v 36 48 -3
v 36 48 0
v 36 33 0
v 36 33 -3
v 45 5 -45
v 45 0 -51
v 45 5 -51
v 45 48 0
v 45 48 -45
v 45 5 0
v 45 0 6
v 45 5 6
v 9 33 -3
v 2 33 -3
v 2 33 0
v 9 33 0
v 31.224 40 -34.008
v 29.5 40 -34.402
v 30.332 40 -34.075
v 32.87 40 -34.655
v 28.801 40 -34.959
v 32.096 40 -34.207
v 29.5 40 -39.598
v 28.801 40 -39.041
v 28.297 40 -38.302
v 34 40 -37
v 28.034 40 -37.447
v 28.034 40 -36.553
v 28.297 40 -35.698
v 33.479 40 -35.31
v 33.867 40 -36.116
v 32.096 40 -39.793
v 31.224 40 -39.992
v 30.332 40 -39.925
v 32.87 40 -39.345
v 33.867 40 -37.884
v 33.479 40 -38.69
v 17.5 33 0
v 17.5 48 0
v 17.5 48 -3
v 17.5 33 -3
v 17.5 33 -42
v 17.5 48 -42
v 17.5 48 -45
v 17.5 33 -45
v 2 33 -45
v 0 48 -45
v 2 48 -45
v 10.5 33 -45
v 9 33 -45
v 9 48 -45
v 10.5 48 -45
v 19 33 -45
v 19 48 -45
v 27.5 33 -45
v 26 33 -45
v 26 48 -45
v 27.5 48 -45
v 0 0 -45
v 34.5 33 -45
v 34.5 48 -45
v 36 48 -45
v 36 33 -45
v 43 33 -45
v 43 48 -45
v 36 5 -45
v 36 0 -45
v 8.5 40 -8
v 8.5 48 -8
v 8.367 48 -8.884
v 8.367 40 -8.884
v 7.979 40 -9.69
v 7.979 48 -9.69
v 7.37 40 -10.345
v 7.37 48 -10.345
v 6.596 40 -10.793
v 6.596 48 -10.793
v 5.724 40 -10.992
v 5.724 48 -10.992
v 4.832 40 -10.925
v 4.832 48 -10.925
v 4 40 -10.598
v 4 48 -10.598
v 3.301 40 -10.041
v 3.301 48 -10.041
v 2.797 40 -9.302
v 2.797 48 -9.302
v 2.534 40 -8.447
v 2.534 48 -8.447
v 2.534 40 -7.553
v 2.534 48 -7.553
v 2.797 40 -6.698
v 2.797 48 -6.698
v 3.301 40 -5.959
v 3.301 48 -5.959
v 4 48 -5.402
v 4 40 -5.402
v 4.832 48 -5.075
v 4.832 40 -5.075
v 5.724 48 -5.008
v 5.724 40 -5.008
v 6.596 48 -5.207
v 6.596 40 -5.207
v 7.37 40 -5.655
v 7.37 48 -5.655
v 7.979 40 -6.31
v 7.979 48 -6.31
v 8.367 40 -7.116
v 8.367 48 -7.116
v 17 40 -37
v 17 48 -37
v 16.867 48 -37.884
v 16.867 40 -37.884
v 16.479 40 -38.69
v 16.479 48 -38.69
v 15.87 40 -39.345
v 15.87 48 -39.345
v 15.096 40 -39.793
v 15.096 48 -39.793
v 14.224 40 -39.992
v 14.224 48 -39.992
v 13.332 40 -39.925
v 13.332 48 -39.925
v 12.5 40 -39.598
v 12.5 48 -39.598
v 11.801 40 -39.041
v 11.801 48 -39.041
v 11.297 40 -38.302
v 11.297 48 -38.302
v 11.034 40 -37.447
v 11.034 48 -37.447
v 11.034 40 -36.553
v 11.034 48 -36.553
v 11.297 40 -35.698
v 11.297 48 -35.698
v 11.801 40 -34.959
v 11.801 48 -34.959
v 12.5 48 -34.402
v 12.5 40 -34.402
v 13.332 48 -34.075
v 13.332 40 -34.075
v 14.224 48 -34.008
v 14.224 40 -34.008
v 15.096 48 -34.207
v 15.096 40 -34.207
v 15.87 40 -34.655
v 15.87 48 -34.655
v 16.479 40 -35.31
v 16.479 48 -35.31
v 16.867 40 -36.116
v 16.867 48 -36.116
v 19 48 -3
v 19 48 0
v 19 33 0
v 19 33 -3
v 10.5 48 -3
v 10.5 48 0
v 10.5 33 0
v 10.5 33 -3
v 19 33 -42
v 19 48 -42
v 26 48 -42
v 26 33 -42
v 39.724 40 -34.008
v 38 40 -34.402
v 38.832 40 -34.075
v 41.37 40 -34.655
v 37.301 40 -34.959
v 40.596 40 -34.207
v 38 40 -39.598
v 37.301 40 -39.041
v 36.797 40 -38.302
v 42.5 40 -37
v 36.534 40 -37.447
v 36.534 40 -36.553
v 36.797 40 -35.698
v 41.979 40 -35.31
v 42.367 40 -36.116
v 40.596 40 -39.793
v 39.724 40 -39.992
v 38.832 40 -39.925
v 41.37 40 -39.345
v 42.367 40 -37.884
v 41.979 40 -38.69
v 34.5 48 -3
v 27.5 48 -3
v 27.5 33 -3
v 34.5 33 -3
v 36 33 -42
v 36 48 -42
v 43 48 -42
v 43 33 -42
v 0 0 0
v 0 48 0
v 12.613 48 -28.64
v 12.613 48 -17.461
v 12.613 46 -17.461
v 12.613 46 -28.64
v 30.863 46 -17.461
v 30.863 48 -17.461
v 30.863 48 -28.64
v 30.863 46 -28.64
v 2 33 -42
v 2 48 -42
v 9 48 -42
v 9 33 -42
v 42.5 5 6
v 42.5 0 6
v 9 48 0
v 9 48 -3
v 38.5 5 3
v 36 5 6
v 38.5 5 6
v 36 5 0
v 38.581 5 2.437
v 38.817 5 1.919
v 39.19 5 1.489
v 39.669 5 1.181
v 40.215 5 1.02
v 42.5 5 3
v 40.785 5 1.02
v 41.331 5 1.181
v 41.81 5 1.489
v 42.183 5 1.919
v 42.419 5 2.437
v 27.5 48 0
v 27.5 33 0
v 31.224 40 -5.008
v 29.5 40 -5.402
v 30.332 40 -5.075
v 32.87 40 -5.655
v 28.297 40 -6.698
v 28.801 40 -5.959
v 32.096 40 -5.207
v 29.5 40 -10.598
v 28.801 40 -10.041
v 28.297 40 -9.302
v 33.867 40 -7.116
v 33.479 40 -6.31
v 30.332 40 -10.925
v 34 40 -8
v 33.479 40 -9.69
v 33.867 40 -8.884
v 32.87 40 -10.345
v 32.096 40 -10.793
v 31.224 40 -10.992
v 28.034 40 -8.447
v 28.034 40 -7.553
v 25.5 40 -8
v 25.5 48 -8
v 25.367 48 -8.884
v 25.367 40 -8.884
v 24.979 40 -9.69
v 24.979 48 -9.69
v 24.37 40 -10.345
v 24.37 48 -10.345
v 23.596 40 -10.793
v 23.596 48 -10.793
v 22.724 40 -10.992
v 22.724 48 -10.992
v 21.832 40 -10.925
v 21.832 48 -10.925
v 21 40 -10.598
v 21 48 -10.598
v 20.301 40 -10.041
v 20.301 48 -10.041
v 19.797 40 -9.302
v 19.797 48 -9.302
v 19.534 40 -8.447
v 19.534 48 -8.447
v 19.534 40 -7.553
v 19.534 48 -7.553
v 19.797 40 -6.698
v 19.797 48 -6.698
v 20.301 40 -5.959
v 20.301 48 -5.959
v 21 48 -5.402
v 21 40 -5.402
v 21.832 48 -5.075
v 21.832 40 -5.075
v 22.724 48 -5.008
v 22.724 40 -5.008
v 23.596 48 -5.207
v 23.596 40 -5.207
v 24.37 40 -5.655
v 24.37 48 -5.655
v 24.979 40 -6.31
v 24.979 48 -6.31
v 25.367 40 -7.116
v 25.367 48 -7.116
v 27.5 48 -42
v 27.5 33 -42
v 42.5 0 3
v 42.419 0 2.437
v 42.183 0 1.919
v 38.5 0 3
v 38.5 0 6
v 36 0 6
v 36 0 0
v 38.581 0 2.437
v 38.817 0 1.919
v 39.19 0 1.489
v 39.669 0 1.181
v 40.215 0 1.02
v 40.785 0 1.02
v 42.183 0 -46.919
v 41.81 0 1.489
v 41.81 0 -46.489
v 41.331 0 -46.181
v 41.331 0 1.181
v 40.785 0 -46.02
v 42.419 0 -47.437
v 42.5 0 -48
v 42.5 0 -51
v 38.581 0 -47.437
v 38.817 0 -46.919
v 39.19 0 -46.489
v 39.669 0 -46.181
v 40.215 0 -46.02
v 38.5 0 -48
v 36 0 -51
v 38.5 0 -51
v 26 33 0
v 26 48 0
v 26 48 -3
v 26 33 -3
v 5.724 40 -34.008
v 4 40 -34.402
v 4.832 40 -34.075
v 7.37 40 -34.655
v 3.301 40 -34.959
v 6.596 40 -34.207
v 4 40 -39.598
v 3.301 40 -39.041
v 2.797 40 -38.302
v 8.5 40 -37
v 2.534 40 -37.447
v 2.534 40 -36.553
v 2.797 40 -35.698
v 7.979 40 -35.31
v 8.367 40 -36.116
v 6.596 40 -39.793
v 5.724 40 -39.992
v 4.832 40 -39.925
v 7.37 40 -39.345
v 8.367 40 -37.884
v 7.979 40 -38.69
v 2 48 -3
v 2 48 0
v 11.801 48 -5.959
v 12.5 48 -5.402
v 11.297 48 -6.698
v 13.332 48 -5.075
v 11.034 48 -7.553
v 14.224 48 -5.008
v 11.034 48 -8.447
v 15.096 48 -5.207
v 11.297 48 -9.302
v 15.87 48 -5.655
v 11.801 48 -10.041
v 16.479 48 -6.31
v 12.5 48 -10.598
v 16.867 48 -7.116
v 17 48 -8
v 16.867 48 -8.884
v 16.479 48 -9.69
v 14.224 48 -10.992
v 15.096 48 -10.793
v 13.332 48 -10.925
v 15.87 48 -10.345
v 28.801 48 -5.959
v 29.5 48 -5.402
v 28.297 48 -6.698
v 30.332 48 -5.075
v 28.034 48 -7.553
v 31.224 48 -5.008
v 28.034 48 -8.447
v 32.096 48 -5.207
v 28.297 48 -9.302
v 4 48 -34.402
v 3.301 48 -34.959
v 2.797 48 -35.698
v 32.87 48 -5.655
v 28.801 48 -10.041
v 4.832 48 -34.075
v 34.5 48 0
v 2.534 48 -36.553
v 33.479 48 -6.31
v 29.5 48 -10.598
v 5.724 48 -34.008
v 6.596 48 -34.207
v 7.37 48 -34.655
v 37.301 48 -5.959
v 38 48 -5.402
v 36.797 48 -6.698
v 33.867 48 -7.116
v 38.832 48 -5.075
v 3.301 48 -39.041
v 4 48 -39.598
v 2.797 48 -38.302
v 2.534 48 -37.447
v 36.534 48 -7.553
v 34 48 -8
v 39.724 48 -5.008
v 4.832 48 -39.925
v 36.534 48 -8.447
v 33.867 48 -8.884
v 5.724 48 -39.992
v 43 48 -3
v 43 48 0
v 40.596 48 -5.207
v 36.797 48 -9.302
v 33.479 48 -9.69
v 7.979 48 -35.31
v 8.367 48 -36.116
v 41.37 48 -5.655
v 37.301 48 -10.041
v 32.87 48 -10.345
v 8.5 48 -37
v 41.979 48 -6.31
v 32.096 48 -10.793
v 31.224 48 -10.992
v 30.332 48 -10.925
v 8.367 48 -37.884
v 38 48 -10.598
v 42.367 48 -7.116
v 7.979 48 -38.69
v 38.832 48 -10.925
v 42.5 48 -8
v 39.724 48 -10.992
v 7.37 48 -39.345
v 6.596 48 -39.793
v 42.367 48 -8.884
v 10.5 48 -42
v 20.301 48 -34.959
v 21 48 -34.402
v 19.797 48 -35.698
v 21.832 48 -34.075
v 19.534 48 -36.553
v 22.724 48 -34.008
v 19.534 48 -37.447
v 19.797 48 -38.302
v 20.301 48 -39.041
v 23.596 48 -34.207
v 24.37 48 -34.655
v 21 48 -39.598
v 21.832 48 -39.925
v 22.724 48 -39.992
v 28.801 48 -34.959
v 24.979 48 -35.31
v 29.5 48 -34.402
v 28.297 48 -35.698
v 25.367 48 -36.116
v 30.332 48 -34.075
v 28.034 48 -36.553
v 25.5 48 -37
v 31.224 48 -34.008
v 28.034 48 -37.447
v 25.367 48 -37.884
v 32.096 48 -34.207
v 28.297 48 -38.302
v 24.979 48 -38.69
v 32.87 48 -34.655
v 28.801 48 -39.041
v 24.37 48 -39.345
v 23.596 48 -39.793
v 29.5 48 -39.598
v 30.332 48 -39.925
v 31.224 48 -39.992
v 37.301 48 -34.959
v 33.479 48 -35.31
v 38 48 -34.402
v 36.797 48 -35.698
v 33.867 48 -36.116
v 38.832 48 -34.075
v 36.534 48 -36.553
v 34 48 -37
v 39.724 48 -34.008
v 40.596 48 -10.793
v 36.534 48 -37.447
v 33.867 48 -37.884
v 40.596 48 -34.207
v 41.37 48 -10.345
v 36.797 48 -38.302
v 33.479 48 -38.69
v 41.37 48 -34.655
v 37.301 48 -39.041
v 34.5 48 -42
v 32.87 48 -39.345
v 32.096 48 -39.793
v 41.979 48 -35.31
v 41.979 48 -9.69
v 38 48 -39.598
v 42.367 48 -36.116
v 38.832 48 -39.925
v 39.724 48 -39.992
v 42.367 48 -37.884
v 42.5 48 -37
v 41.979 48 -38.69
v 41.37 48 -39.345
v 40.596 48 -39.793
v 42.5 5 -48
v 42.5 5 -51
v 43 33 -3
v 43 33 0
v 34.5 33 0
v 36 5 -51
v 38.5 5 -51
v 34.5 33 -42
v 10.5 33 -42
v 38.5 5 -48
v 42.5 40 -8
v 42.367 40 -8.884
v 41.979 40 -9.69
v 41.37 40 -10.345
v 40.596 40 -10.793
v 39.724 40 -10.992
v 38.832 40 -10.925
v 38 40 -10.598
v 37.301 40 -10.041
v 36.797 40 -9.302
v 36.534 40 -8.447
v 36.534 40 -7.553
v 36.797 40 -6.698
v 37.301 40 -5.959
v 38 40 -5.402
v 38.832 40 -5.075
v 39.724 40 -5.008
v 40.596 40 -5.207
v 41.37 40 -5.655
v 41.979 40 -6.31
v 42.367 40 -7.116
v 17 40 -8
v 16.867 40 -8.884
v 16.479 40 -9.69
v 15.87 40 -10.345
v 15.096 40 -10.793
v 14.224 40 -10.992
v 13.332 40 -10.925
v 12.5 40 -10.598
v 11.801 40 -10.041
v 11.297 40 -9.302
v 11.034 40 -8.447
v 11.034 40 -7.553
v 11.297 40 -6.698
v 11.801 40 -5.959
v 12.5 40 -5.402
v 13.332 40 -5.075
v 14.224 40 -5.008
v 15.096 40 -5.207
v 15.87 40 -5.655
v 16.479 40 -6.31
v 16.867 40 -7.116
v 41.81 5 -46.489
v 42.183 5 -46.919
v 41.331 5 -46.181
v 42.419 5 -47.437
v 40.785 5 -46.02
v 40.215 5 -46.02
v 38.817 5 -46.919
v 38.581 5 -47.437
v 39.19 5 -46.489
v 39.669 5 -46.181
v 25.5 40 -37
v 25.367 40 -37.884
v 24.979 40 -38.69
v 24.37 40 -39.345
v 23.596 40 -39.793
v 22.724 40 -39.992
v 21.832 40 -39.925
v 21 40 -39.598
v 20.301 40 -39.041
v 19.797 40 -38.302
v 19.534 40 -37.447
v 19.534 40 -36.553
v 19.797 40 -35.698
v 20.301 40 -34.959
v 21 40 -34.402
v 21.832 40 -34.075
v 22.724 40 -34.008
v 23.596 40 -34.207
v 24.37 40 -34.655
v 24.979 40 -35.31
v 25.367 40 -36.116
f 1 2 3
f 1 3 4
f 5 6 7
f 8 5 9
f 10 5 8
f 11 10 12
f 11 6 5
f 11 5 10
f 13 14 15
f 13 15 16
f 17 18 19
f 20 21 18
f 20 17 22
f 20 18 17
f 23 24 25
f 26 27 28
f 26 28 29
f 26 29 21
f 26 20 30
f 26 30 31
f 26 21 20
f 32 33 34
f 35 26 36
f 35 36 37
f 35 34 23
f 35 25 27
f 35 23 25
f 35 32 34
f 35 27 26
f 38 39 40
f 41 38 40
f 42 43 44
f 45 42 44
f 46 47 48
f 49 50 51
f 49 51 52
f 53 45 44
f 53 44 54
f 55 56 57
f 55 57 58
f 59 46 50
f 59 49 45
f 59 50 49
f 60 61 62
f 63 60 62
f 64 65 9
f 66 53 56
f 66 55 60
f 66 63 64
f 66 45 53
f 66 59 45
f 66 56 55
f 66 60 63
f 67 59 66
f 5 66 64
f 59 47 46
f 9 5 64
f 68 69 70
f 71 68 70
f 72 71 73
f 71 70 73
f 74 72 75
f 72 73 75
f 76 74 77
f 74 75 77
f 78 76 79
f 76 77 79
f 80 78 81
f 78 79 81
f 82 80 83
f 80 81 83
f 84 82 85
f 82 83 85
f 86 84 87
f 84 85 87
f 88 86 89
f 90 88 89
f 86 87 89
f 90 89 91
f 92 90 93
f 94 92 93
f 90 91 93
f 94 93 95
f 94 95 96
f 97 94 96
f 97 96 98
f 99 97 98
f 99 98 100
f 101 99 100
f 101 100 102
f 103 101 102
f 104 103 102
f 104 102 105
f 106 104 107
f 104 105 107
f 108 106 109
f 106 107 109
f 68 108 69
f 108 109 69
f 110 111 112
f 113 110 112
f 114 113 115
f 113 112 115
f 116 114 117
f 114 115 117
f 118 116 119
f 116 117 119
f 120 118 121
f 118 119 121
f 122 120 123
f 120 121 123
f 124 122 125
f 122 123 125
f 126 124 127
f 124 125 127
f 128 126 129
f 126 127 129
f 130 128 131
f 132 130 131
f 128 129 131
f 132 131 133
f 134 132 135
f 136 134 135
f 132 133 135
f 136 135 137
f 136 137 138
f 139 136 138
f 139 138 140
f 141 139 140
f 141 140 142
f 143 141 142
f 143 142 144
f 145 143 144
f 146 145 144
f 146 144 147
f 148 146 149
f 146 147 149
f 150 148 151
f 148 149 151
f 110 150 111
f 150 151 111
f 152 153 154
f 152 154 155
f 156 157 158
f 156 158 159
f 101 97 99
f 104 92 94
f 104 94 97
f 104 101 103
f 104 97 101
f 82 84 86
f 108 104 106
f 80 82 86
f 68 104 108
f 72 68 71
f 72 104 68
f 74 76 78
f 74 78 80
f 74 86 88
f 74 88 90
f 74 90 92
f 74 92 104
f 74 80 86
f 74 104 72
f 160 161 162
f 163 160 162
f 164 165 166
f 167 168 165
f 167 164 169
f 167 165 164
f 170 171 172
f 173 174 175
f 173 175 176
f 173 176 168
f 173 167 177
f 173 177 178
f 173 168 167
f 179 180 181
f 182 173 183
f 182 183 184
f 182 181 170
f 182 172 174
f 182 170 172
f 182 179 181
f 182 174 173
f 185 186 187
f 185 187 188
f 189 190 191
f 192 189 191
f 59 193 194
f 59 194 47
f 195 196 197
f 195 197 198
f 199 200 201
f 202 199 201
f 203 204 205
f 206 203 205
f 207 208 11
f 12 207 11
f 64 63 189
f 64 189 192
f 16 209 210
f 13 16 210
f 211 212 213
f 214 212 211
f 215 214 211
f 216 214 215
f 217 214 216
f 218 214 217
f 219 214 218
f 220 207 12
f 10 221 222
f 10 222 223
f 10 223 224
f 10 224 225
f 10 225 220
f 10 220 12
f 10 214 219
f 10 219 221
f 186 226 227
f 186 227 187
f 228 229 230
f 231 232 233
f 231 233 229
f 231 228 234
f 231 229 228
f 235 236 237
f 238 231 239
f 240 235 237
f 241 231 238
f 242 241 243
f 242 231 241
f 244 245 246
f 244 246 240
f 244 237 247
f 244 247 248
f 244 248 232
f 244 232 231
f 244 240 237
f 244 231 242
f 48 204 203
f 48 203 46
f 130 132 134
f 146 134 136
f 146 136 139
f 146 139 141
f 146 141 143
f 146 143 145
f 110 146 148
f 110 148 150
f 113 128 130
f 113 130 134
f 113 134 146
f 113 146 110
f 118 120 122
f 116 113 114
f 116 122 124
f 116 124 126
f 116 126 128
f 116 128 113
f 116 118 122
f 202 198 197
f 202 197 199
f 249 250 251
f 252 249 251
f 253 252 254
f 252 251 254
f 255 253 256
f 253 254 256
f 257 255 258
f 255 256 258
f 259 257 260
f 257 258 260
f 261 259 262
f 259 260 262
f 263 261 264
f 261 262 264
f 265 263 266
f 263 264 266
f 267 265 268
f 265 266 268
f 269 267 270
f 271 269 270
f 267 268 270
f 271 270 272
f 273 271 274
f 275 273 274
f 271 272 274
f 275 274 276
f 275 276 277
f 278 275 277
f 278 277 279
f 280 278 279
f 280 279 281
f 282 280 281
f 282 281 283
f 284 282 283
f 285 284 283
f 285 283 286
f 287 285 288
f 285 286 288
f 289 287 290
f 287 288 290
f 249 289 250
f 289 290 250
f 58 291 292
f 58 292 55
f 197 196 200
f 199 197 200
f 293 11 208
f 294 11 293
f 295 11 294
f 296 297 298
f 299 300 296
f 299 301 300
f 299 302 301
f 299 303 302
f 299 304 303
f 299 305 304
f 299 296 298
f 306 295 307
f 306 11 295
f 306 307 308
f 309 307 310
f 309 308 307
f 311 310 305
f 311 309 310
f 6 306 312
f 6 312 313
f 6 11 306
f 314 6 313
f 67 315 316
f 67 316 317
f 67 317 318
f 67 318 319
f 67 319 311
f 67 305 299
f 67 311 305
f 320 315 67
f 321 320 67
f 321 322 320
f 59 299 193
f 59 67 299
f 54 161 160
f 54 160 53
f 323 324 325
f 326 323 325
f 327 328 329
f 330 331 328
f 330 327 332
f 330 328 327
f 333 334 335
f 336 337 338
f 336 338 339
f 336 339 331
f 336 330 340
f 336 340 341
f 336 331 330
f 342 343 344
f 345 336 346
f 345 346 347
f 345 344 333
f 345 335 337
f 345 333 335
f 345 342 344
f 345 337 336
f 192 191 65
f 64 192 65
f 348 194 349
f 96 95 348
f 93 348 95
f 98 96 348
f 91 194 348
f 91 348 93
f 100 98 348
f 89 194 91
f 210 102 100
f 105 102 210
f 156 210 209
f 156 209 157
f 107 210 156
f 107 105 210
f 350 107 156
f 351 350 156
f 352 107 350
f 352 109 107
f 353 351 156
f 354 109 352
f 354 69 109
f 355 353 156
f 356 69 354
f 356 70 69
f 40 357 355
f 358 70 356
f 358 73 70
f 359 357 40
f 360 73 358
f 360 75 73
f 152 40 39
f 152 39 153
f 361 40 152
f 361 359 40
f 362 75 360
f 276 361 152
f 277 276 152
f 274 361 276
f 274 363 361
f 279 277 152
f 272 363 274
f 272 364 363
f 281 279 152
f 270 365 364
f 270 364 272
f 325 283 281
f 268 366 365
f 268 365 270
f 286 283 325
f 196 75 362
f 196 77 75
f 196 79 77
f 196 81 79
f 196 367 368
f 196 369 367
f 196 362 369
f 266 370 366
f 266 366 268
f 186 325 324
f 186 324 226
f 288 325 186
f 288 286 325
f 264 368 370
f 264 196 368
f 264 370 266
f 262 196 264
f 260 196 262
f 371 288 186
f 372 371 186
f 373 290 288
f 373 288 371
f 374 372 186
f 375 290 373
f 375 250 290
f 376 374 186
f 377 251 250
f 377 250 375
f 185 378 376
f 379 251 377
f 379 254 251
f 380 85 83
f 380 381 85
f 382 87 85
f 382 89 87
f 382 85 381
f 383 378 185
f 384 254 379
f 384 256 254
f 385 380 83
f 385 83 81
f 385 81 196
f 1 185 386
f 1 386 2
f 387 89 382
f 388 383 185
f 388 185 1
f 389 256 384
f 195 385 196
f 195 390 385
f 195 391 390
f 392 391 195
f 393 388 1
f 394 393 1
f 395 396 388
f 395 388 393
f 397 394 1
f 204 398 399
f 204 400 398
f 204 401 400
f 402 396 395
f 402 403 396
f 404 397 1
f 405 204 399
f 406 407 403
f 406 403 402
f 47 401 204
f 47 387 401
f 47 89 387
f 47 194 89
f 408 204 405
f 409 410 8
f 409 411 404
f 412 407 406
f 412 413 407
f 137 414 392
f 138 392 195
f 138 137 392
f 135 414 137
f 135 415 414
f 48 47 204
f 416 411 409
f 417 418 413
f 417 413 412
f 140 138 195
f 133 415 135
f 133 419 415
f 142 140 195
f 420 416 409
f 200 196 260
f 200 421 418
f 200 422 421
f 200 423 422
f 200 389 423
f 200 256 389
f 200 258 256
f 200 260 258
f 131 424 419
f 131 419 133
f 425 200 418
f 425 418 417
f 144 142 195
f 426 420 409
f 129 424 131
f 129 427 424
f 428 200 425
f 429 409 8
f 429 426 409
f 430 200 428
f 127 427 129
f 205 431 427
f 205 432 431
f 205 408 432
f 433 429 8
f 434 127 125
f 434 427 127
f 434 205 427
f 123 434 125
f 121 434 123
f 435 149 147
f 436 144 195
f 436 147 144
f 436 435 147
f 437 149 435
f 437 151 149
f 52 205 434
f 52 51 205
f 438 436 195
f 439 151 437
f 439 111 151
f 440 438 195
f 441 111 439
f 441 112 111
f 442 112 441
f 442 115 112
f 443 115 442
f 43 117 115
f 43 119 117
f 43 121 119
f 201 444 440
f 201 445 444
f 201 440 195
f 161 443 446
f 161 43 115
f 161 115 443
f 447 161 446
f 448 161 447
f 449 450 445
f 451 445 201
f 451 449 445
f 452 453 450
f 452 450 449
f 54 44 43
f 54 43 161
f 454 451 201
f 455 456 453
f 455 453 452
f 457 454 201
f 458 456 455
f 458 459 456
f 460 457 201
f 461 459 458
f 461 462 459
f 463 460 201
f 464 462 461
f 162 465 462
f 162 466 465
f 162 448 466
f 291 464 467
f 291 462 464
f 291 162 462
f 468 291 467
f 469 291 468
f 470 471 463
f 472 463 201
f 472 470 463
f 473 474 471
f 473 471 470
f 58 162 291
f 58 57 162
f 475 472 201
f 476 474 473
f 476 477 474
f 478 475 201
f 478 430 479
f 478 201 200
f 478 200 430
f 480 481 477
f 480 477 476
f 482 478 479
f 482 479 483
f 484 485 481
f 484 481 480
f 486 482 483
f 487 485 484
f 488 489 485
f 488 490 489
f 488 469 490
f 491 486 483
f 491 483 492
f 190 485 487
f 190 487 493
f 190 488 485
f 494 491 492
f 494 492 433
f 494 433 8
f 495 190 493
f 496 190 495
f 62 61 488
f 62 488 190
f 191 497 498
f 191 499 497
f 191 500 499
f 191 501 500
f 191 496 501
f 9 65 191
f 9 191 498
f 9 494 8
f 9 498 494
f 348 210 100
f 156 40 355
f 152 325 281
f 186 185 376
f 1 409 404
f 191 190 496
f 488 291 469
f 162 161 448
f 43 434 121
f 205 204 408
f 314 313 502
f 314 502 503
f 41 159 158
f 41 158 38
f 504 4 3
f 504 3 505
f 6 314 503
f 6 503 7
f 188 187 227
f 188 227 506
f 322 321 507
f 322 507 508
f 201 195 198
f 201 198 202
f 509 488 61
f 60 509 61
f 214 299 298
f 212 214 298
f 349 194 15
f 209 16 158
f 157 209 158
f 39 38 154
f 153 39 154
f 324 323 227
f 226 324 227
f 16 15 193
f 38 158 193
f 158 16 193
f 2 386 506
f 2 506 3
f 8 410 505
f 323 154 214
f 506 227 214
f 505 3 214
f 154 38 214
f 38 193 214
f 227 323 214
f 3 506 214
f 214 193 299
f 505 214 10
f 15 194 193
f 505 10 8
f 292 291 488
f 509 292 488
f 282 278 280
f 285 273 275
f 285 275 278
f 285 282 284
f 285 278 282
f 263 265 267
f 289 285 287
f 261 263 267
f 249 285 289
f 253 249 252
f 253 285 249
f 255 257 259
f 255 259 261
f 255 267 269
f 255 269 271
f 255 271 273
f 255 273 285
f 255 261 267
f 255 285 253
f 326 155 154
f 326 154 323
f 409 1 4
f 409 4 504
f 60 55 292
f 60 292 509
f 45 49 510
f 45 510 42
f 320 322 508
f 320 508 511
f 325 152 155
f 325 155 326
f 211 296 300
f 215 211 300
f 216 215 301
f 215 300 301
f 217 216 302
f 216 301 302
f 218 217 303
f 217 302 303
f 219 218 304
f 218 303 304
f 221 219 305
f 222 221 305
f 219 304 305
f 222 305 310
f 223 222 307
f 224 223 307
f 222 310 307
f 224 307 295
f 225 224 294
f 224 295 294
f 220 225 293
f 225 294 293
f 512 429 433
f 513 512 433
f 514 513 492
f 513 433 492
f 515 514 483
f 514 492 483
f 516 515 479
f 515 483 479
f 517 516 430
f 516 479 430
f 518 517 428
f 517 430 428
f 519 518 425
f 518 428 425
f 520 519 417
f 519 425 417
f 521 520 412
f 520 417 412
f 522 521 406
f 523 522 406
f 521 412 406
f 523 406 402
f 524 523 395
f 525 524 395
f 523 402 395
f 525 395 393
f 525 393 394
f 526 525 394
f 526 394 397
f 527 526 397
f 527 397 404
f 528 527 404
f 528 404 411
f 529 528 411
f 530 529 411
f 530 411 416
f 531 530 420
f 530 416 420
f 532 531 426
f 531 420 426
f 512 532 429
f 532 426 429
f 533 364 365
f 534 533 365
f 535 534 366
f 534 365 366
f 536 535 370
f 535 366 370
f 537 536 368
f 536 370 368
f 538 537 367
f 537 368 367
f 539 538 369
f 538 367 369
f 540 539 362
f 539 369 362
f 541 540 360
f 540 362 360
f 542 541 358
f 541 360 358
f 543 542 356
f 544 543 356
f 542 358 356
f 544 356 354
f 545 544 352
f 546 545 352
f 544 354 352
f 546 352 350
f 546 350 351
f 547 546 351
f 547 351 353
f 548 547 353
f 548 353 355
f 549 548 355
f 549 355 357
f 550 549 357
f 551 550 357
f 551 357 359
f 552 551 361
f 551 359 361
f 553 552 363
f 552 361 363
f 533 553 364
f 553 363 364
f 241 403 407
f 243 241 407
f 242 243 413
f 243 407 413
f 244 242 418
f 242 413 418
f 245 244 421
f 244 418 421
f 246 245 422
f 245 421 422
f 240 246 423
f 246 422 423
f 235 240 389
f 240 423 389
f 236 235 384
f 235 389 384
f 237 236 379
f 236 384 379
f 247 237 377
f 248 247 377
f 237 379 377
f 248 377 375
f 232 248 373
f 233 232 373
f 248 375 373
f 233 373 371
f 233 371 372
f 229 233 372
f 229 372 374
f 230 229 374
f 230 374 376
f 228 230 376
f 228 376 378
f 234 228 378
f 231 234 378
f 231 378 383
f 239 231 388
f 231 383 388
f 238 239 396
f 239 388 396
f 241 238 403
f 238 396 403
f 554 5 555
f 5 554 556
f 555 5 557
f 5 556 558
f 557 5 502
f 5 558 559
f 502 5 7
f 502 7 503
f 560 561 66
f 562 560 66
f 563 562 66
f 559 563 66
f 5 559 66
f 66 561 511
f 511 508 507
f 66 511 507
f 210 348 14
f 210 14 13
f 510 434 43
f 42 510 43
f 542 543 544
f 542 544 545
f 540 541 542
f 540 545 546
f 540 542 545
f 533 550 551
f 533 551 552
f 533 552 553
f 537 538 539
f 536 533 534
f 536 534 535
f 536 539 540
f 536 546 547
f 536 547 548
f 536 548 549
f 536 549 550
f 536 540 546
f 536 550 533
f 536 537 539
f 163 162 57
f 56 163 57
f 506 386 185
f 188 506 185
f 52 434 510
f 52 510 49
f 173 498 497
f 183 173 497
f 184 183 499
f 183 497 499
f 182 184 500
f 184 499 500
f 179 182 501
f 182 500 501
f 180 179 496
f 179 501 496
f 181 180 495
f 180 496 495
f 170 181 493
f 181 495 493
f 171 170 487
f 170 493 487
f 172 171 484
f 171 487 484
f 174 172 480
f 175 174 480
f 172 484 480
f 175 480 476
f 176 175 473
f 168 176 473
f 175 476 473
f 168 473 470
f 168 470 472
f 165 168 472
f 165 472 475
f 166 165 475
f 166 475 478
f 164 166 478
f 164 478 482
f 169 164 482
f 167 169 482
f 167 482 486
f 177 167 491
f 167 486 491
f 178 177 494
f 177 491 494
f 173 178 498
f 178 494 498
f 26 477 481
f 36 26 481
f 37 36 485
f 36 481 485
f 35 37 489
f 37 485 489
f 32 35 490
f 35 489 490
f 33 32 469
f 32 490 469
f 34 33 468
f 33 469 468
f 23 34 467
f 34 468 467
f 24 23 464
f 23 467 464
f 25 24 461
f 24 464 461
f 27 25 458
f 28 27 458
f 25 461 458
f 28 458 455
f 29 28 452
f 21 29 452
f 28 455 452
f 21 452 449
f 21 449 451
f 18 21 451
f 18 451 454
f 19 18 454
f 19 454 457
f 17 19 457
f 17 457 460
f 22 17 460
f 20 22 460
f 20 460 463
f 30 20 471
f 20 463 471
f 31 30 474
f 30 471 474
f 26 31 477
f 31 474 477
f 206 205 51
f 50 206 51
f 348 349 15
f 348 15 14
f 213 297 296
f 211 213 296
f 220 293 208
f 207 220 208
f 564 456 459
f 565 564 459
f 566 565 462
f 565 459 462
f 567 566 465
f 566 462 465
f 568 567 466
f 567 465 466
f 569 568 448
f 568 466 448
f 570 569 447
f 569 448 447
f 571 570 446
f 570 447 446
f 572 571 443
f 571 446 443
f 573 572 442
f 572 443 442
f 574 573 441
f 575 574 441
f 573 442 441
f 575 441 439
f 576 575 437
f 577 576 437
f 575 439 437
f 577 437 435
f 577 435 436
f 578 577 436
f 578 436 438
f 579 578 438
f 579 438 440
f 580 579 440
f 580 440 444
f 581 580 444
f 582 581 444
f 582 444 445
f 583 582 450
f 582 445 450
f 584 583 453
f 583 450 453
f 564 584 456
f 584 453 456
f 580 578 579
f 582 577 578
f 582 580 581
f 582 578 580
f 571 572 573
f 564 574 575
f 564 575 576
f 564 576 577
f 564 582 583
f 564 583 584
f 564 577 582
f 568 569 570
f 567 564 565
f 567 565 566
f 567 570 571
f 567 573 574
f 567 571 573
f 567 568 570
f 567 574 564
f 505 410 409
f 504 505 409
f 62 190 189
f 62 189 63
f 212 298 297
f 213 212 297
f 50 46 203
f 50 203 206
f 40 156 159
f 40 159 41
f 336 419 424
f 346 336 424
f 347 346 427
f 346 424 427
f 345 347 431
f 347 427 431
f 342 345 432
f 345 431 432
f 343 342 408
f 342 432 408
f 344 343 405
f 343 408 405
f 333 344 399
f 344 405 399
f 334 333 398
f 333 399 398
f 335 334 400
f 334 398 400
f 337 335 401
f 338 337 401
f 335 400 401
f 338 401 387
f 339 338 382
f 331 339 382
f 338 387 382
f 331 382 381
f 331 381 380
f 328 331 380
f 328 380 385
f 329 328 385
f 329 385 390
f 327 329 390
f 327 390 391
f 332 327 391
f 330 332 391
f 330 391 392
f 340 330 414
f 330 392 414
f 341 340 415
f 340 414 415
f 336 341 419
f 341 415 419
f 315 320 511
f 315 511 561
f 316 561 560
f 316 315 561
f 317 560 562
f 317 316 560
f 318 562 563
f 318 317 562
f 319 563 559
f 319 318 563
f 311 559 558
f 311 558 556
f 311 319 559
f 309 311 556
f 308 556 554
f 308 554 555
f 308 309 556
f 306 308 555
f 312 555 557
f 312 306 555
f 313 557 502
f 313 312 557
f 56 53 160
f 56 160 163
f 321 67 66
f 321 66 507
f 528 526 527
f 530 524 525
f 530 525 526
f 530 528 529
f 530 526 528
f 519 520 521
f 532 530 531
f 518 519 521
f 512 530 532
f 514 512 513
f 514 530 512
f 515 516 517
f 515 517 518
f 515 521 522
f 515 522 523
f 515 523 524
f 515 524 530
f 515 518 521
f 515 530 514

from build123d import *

# Parameters (mm, degrees)
SKETCH1_W           = 45
SKETCH1_H           = 45
BOSS_EXTRUDE1_DEPTH = 48
SKETCH2_W           = 7
SKETCH2_H           = 3
CUT_EXTRUDE1_DEPTH  = 15
SKETCH3_R           = 3
CUT_EXTRUDE2_DEPTH  = 8
SKETCH4_W           = 18.249611446
SKETCH4_H           = 11.178416291
CUT_EXTRUDE3_DEPTH  = 2
BOSS_EXTRUDE2_DEPTH = 5


with BuildPart() as part:
    # Sketch1 → Boss-Extrude1 (new body)
    with BuildSketch(Plane(origin=(0, 0, 0), x_dir=(1, 0, 0), z_dir=(0, 1, 0))):
        with Locations((22.5, 22.5)):
            Rectangle(SKETCH1_W, SKETCH1_H)
    extrude(amount=BOSS_EXTRUDE1_DEPTH)

    # Sketch2 → Cut-Extrude1 (cut)
    with BuildSketch(Plane(origin=(0, 48, 0), x_dir=(1, 0, 0), z_dir=(0, 1, 0))):
        with Locations((5.5, 1.5)):
            Rectangle(SKETCH2_W, SKETCH2_H)
        with Locations((14, 1.5)):
            Rectangle(SKETCH2_W, SKETCH2_H)
        with Locations((22.5, 1.5)):
            Rectangle(SKETCH2_W, SKETCH2_H)
        with Locations((31, 1.5)):
            Rectangle(SKETCH2_W, SKETCH2_H)
        with Locations((39.5, 1.5)):
            Rectangle(SKETCH2_W, SKETCH2_H)
        with Locations((39.5, 43.5)):
            Rectangle(SKETCH2_W, SKETCH2_H)
        with Locations((31, 43.5)):
            Rectangle(SKETCH2_W, SKETCH2_H)
        with Locations((22.5, 43.5)):
            Rectangle(SKETCH2_W, SKETCH2_H)
        with Locations((14, 43.5)):
            Rectangle(SKETCH2_W, SKETCH2_H)
        with Locations((5.5, 43.5)):
            Rectangle(SKETCH2_W, SKETCH2_H)
    extrude(amount=-CUT_EXTRUDE1_DEPTH, mode=Mode.SUBTRACT)

    # Sketch3 → Cut-Extrude2 (cut)
    with BuildSketch(Plane(origin=(0, 48, 0), x_dir=(1, 0, 0), z_dir=(0, 1, 0))):
        with Locations((5.5, 8)):
            Circle(SKETCH3_R)
        with Locations((14, 8)):
            Circle(SKETCH3_R)
        with Locations((22.5, 8)):
            Circle(SKETCH3_R)
        with Locations((31, 8)):
            Circle(SKETCH3_R)
        with Locations((39.5, 8)):
            Circle(SKETCH3_R)
        with Locations((39.5, 37)):
            Circle(SKETCH3_R)
        with Locations((31, 37)):
            Circle(SKETCH3_R)
        with Locations((22.5, 37)):
            Circle(SKETCH3_R)
        with Locations((14, 37)):
            Circle(SKETCH3_R)
        with Locations((5.5, 37)):
            Circle(SKETCH3_R)
    extrude(amount=-CUT_EXTRUDE2_DEPTH, mode=Mode.SUBTRACT)

    # Sketch4 → Cut-Extrude3 (cut)
    with BuildSketch(Plane(origin=(0, 48, 0), x_dir=(1, 0, 0), z_dir=(0, 1, 0))):
        with Locations((21.737835253, 23.050452318)):
            Rectangle(SKETCH4_W, SKETCH4_H)
    extrude(amount=-CUT_EXTRUDE3_DEPTH, mode=Mode.SUBTRACT)

    # Sketch5 → Boss-Extrude2 (add)
    with BuildSketch(Plane(origin=(0, 0, 0), x_dir=(-1, 0, 0), z_dir=(0, -1, 0))):
        with BuildLine():
            Line((-42.5, 48), (-42.5, 51))
            Line((-42.5, 51), (-45, 51))
            Line((-45, 51), (-45, 45))
            Line((-45, 45), (-36, 45))
            Line((-36, 45), (-36, 51))
            Line((-36, 51), (-38.5, 51))
            Line((-38.5, 51), (-38.5, 48))
            ThreePointArc((-38.5, 48), (-40.5, 46), (-42.5, 48))
        make_face()
        with BuildLine():
            Line((-45, 0), (-36, 0))
            Line((-36, 0), (-36, -6))
            Line((-36, -6), (-38.5, -6))
            Line((-38.5, -6), (-38.5, -3))
            ThreePointArc((-38.5, -3), (-40.5, -1), (-42.5, -3))
            Line((-42.5, -3), (-42.5, -6))
            Line((-42.5, -6), (-45, -6))
            Line((-45, -6), (-45, 0))
        make_face()
    extrude(amount=-BOSS_EXTRUDE2_DEPTH)


solid = part.part
